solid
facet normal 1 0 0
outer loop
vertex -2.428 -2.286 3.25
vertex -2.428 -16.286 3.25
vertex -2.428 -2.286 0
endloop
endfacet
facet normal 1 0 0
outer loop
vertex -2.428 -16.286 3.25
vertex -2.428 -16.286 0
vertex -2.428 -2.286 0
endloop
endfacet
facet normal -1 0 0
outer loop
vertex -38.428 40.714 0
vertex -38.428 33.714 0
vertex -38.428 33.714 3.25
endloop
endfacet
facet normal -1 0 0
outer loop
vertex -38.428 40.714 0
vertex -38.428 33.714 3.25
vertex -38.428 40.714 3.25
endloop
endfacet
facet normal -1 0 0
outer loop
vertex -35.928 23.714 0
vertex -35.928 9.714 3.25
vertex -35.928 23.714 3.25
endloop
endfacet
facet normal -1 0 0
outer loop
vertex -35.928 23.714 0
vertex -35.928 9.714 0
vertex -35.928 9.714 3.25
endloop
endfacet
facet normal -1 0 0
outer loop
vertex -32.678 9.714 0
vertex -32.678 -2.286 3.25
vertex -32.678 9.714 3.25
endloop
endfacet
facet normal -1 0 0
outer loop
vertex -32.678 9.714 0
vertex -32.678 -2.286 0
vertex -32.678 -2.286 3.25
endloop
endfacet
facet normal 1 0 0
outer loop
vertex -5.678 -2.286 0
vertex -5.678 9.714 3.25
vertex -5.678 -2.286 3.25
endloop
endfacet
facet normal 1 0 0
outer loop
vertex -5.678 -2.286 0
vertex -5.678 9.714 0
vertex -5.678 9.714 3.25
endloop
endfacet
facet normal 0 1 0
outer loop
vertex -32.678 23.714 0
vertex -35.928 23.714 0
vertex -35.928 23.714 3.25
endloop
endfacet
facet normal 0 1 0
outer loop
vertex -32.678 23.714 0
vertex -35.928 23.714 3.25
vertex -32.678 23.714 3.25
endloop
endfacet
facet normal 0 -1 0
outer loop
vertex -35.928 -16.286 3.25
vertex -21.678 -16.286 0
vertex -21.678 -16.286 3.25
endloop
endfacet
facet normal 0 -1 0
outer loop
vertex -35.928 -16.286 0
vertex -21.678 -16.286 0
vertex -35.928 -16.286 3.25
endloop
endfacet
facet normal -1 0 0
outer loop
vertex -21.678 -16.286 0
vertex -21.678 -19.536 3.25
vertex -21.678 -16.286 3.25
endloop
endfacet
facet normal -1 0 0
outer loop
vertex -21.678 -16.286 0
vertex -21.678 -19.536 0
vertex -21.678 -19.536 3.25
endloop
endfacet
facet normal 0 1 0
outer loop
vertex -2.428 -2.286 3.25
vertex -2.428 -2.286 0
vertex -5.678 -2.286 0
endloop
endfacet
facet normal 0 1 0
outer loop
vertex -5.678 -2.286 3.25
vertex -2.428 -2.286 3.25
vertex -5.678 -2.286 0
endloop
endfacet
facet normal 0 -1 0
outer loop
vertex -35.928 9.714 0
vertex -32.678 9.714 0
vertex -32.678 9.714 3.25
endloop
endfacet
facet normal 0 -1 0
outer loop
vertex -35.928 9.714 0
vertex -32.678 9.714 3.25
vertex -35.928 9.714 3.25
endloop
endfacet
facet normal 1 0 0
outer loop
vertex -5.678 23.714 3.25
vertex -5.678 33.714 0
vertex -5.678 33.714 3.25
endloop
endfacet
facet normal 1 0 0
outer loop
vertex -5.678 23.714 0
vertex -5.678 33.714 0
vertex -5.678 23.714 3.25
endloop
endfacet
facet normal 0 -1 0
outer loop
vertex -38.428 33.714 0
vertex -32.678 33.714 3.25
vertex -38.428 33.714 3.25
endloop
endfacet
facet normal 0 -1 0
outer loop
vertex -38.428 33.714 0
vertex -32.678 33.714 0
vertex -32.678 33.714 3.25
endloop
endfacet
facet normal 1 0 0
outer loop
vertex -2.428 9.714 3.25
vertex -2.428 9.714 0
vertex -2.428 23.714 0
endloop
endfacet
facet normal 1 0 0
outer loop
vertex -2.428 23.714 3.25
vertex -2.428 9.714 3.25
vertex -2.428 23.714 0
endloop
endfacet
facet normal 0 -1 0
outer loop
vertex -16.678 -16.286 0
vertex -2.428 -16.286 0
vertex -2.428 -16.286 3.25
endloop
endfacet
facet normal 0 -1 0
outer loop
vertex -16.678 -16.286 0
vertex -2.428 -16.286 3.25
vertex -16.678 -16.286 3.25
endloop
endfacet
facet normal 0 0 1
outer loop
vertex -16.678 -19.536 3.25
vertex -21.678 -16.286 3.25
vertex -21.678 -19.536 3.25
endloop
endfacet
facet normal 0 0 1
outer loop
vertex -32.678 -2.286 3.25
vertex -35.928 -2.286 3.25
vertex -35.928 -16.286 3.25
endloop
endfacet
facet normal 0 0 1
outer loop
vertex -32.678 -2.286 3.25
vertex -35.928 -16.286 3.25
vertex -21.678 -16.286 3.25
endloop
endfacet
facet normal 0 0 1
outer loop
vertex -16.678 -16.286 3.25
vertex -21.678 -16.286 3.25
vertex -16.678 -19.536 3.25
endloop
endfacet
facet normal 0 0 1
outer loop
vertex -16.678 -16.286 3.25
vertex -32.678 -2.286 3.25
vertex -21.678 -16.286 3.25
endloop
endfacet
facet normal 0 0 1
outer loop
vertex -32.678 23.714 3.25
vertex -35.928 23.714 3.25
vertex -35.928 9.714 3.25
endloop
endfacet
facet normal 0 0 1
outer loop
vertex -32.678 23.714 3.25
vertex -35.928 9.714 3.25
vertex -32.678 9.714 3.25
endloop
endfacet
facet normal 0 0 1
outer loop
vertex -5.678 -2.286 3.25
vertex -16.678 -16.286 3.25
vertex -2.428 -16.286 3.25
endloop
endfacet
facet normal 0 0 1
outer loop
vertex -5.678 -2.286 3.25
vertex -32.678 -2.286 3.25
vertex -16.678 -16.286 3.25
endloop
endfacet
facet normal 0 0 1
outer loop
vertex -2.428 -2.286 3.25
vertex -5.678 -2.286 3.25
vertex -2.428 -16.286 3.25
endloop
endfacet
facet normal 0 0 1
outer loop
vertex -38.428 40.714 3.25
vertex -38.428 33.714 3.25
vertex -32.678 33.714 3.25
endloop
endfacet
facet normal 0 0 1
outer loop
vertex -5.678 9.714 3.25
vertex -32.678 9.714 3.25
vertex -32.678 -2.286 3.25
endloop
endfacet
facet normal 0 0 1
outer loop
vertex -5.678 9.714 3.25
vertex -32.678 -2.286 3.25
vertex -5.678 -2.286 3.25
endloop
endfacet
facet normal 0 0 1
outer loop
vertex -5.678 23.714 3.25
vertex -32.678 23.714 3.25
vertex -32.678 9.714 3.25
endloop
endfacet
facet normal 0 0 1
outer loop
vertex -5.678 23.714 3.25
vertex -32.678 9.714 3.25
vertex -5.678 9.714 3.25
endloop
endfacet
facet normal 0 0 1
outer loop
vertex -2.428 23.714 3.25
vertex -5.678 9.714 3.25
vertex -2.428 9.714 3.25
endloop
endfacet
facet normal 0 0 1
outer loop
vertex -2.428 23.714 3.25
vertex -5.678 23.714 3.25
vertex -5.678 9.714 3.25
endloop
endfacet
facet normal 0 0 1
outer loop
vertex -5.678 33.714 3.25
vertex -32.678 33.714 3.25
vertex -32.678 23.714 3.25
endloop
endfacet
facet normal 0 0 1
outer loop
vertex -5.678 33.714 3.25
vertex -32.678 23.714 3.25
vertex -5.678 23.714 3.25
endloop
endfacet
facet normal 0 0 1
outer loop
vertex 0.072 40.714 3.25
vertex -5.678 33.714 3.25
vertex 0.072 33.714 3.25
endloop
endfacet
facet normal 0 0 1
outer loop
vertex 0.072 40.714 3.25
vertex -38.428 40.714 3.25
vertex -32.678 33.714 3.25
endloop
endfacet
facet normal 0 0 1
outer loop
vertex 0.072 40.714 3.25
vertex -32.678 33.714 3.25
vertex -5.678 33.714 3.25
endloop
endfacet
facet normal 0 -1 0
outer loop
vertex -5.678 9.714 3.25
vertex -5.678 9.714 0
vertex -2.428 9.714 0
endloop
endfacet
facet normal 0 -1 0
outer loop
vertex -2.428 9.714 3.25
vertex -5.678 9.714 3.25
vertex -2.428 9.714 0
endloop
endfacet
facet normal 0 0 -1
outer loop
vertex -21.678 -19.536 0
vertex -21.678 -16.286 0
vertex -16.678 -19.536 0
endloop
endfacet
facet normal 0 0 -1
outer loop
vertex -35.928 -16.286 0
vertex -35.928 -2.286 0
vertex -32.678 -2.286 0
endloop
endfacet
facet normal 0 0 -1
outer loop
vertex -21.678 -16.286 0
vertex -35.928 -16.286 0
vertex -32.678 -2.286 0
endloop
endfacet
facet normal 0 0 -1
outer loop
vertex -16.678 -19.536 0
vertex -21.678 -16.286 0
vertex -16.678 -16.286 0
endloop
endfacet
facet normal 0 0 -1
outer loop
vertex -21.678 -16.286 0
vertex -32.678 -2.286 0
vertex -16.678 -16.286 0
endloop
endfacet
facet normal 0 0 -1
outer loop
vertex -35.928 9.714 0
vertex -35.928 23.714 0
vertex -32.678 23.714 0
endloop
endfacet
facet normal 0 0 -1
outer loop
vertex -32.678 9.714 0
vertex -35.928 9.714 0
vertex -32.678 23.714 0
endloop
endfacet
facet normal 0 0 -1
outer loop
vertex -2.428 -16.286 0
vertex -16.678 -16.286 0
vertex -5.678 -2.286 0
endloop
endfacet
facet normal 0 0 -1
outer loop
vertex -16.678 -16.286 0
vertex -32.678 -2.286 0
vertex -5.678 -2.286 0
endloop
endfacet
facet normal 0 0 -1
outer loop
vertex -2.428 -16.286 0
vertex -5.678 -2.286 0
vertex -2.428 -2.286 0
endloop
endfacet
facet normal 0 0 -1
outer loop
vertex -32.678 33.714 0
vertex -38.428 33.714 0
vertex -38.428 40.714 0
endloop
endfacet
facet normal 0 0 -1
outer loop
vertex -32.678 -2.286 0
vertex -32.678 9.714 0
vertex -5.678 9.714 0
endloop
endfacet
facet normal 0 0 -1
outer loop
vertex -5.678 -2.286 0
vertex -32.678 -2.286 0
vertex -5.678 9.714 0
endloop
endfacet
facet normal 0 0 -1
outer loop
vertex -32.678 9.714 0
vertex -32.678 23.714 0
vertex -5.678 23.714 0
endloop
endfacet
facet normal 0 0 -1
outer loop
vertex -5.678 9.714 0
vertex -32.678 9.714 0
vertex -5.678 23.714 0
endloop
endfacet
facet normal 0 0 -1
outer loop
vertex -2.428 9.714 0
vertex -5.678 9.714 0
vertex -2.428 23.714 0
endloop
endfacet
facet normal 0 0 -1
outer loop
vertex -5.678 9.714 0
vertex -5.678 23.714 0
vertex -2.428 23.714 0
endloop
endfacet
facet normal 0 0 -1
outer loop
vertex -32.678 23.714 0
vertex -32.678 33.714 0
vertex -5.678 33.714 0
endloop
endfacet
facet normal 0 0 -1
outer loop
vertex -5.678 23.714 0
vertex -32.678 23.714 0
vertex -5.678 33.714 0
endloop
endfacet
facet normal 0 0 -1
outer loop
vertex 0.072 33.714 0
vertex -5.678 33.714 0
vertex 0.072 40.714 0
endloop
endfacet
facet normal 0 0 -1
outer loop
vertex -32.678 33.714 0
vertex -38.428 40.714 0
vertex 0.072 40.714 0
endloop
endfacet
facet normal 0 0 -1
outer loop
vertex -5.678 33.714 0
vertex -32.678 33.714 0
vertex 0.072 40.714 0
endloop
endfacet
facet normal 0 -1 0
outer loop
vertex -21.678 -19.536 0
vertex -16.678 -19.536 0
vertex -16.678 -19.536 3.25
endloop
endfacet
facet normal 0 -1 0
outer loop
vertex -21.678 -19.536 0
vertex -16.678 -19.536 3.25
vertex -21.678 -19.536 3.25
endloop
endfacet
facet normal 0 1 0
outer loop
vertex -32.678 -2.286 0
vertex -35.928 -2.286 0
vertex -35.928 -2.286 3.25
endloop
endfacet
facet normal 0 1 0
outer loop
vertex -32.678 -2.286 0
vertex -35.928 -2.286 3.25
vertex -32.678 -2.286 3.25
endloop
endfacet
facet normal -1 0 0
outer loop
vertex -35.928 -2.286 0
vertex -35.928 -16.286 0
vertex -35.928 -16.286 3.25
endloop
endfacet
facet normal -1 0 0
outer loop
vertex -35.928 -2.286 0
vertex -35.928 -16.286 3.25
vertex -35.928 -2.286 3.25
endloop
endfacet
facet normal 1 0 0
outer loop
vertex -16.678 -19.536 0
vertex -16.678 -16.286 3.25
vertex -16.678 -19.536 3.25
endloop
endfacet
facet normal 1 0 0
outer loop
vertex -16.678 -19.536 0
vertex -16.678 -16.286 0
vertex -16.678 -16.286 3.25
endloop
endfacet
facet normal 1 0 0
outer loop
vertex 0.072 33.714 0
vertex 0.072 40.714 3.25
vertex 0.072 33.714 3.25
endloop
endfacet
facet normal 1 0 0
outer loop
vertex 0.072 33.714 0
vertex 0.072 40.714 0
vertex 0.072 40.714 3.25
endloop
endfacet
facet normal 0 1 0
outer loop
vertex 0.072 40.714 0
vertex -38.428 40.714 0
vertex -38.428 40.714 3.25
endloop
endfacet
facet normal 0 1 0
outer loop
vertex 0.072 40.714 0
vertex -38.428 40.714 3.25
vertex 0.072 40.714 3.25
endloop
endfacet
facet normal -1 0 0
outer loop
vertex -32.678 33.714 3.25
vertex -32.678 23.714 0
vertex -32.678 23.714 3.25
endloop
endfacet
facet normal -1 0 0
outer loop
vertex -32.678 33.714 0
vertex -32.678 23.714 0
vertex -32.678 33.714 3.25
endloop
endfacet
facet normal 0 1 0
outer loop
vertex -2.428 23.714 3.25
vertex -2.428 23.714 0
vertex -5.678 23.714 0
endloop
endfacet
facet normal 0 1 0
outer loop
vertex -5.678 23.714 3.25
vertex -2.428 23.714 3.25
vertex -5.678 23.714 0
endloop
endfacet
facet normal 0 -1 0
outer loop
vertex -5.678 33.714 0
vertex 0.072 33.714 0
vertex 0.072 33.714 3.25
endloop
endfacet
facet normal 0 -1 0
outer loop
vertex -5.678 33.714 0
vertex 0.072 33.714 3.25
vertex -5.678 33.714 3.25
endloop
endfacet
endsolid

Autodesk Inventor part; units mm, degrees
ref_plane "YZ Plane" through (0, 0, 0) normal (1, 0, 0) x (0, 1, 0)
ref_plane "XZ Plane" through (0, 0, 0) normal (0, 1, 0) x (-1, 0, 0)
ref_plane "XY Plane" through (0, 0, 0) normal (0, 0, 1) x (1, 0, 0)
sketch "Block1" plane through (0, 0, 0) normal (0, 0, 1) x (1, 0, 0)
  circle A0 centre (74.029, 24.2723) radius 1
  line L0 (49.279, 30.4723) -> (71.779, 30.4723)
  line L1 (71.779, 30.4723) -> (71.779, 18.0723)
  line L2 (71.779, 18.0723) -> (49.279, 18.0723)
  line L3 (49.279, 18.0723) -> (49.279, 30.4723)
  line L4 (49.279, 30.4723) -> (44.779, 30.4723)
  line L5 (44.779, 30.4723) -> (44.779, 18.0723)
  line L6 (44.779, 18.0723) -> (49.279, 18.0723)
  line L7 (49.279, 18.0723) -> (49.279, 30.4723)
  line L8 (71.779, 30.4723) -> (76.279, 30.4723)
  line L9 (76.279, 30.4723) -> (76.279, 18.0723)
  line L10 (76.279, 18.0723) -> (71.779, 18.0723)
  line L11 (71.779, 18.0723) -> (71.779, 30.4723)
  line L12 (44.779, 24.2723) -> (76.279, 24.2723) construction
  line L13 (47.029, 30.4723) -> (47.029, 18.0723) construction
  circle A1 centre (47.029, 24.2723) radius 1
  line L14 (74.029, 30.4723) -> (74.029, 18.0723) construction
  point P0 (60.979, 24.0984)
  dimension "d7" = 22.5
  dimension "d8" = 12.4
  dimension "d9" = 4.5
  dimension "d10" = 4.5
  dimension "d11" = 2
  dimension "d12" = 2
sketch "Sketch1" plane through (0, 0, 0) normal (0, 0, 1) x (1, 0, 0)
  line L0 (-38.4282, 40.714) -> (0.0718, 40.714)
  line L1 (0.0718, 40.714) -> (0.0718, 33.714)
  line L2 (0.0718, 33.714) -> (-38.4282, 33.714)
  line L3 (-38.4282, 33.714) -> (-38.4282, 40.714)
  line L4 (-92.7646, -8.503) -> (-89.7646, -8.503)
  line L5 (-89.7646, -8.503) -> (-89.7646, -11.753)
  line L6 (-89.7646, -11.753) -> (-92.7646, -11.753)
  line L7 (-92.7646, -11.753) -> (-92.7646, -8.503)
  line L8 (-92.7646, -21.6527) -> (-89.7646, -21.6527)
  line L9 (-89.7646, -21.6527) -> (-89.7646, -21.7527)
  line L10 (-89.7646, -21.7527) -> (-92.7646, -21.7527)
  line L11 (-92.7646, -21.7527) -> (-92.7646, -21.6527)
  line L12 (-32.6782, 33.714) -> (-5.6782, 33.714)
  line L13 (-5.6782, 33.714) -> (-5.6782, -16.286)
  line L14 (-5.6782, -16.286) -> (-32.6782, -16.286)
  line L15 (-32.6782, -16.286) -> (-32.6782, 33.714)
  line L16 (-19.1782, 40.714) -> (-19.1782, 33.714) construction
  line L17 (-19.1782, -16.286) -> (-19.1782, 33.714) construction
  line L18 (-35.9282, 23.714) -> (-32.6782, 23.714)
  line L19 (-32.6782, 23.714) -> (-32.6782, 9.714)
  line L20 (-32.6782, 9.714) -> (-35.9282, 9.714)
  line L21 (-35.9282, 9.714) -> (-35.9282, 23.714)
  line L22 (-2.4282, 23.714) -> (-5.6782, 23.714)
  line L23 (-5.6782, 23.714) -> (-5.6782, 9.714)
  line L24 (-5.6782, 9.714) -> (-2.4282, 9.714)
  line L25 (-2.4282, 9.714) -> (-2.4282, 23.714)
  line L26 (-35.9282, -2.286) -> (-32.6782, -2.286)
  line L27 (-32.6782, -2.286) -> (-32.6782, -16.286)
  line L28 (-32.6782, -16.286) -> (-35.9282, -16.286)
  line L29 (-35.9282, -16.286) -> (-35.9282, -2.286)
  line L30 (-2.4282, -2.286) -> (-5.6782, -2.286)
  line L31 (-5.6782, -2.286) -> (-5.6782, -16.286)
  line L32 (-5.6782, -16.286) -> (-2.4282, -16.286)
  line L33 (-2.4282, -16.286) -> (-2.4282, -2.286)
  line L34 (-21.6782, -16.286) -> (-16.6782, -16.286)
  line L35 (-16.6782, -16.286) -> (-16.6782, -19.536)
  line L36 (-16.6782, -19.536) -> (-21.6782, -19.536)
  line L37 (-21.6782, -19.536) -> (-21.6782, -16.286)
  line L38 (-19.1782, -16.286) -> (-19.1782, -19.536) construction
  point P0 (0, 0)
  dimension "d0" = 3
  dimension "mat" = 3.25
  dimension "d2" = 3
  dimension "d3" = 0.1
  dimension "d4" = 38.5
  dimension "d6" = 7
  dimension "d17" = 27
  dimension "d20" = 50
  dimension "d23" = 3.25
  dimension "d24" = 14
  dimension "d25" = 10
  dimension "d26" = 3.25
  dimension "d27" = 14
  dimension "d28" = 5
  dimension "d29" = 3.25
extrude "Extrusion2" add sketch "Sketch1" along normal blind 3.25 contours L0 L1 L2 L3 | L2 L13 L14 L15 | L15 L20 L21 L18 | L22 L25 L24 L13 | L15 L28 L29 L26 | L30 L33 L32 L13 | L14 L35 L36 L37
equation "\"d23\" = mat"
equation "\"d26\" = mat"
equation "\"d29\" = mat"
equation "\"d30\" = mat"
properties part number "arm-servo"
